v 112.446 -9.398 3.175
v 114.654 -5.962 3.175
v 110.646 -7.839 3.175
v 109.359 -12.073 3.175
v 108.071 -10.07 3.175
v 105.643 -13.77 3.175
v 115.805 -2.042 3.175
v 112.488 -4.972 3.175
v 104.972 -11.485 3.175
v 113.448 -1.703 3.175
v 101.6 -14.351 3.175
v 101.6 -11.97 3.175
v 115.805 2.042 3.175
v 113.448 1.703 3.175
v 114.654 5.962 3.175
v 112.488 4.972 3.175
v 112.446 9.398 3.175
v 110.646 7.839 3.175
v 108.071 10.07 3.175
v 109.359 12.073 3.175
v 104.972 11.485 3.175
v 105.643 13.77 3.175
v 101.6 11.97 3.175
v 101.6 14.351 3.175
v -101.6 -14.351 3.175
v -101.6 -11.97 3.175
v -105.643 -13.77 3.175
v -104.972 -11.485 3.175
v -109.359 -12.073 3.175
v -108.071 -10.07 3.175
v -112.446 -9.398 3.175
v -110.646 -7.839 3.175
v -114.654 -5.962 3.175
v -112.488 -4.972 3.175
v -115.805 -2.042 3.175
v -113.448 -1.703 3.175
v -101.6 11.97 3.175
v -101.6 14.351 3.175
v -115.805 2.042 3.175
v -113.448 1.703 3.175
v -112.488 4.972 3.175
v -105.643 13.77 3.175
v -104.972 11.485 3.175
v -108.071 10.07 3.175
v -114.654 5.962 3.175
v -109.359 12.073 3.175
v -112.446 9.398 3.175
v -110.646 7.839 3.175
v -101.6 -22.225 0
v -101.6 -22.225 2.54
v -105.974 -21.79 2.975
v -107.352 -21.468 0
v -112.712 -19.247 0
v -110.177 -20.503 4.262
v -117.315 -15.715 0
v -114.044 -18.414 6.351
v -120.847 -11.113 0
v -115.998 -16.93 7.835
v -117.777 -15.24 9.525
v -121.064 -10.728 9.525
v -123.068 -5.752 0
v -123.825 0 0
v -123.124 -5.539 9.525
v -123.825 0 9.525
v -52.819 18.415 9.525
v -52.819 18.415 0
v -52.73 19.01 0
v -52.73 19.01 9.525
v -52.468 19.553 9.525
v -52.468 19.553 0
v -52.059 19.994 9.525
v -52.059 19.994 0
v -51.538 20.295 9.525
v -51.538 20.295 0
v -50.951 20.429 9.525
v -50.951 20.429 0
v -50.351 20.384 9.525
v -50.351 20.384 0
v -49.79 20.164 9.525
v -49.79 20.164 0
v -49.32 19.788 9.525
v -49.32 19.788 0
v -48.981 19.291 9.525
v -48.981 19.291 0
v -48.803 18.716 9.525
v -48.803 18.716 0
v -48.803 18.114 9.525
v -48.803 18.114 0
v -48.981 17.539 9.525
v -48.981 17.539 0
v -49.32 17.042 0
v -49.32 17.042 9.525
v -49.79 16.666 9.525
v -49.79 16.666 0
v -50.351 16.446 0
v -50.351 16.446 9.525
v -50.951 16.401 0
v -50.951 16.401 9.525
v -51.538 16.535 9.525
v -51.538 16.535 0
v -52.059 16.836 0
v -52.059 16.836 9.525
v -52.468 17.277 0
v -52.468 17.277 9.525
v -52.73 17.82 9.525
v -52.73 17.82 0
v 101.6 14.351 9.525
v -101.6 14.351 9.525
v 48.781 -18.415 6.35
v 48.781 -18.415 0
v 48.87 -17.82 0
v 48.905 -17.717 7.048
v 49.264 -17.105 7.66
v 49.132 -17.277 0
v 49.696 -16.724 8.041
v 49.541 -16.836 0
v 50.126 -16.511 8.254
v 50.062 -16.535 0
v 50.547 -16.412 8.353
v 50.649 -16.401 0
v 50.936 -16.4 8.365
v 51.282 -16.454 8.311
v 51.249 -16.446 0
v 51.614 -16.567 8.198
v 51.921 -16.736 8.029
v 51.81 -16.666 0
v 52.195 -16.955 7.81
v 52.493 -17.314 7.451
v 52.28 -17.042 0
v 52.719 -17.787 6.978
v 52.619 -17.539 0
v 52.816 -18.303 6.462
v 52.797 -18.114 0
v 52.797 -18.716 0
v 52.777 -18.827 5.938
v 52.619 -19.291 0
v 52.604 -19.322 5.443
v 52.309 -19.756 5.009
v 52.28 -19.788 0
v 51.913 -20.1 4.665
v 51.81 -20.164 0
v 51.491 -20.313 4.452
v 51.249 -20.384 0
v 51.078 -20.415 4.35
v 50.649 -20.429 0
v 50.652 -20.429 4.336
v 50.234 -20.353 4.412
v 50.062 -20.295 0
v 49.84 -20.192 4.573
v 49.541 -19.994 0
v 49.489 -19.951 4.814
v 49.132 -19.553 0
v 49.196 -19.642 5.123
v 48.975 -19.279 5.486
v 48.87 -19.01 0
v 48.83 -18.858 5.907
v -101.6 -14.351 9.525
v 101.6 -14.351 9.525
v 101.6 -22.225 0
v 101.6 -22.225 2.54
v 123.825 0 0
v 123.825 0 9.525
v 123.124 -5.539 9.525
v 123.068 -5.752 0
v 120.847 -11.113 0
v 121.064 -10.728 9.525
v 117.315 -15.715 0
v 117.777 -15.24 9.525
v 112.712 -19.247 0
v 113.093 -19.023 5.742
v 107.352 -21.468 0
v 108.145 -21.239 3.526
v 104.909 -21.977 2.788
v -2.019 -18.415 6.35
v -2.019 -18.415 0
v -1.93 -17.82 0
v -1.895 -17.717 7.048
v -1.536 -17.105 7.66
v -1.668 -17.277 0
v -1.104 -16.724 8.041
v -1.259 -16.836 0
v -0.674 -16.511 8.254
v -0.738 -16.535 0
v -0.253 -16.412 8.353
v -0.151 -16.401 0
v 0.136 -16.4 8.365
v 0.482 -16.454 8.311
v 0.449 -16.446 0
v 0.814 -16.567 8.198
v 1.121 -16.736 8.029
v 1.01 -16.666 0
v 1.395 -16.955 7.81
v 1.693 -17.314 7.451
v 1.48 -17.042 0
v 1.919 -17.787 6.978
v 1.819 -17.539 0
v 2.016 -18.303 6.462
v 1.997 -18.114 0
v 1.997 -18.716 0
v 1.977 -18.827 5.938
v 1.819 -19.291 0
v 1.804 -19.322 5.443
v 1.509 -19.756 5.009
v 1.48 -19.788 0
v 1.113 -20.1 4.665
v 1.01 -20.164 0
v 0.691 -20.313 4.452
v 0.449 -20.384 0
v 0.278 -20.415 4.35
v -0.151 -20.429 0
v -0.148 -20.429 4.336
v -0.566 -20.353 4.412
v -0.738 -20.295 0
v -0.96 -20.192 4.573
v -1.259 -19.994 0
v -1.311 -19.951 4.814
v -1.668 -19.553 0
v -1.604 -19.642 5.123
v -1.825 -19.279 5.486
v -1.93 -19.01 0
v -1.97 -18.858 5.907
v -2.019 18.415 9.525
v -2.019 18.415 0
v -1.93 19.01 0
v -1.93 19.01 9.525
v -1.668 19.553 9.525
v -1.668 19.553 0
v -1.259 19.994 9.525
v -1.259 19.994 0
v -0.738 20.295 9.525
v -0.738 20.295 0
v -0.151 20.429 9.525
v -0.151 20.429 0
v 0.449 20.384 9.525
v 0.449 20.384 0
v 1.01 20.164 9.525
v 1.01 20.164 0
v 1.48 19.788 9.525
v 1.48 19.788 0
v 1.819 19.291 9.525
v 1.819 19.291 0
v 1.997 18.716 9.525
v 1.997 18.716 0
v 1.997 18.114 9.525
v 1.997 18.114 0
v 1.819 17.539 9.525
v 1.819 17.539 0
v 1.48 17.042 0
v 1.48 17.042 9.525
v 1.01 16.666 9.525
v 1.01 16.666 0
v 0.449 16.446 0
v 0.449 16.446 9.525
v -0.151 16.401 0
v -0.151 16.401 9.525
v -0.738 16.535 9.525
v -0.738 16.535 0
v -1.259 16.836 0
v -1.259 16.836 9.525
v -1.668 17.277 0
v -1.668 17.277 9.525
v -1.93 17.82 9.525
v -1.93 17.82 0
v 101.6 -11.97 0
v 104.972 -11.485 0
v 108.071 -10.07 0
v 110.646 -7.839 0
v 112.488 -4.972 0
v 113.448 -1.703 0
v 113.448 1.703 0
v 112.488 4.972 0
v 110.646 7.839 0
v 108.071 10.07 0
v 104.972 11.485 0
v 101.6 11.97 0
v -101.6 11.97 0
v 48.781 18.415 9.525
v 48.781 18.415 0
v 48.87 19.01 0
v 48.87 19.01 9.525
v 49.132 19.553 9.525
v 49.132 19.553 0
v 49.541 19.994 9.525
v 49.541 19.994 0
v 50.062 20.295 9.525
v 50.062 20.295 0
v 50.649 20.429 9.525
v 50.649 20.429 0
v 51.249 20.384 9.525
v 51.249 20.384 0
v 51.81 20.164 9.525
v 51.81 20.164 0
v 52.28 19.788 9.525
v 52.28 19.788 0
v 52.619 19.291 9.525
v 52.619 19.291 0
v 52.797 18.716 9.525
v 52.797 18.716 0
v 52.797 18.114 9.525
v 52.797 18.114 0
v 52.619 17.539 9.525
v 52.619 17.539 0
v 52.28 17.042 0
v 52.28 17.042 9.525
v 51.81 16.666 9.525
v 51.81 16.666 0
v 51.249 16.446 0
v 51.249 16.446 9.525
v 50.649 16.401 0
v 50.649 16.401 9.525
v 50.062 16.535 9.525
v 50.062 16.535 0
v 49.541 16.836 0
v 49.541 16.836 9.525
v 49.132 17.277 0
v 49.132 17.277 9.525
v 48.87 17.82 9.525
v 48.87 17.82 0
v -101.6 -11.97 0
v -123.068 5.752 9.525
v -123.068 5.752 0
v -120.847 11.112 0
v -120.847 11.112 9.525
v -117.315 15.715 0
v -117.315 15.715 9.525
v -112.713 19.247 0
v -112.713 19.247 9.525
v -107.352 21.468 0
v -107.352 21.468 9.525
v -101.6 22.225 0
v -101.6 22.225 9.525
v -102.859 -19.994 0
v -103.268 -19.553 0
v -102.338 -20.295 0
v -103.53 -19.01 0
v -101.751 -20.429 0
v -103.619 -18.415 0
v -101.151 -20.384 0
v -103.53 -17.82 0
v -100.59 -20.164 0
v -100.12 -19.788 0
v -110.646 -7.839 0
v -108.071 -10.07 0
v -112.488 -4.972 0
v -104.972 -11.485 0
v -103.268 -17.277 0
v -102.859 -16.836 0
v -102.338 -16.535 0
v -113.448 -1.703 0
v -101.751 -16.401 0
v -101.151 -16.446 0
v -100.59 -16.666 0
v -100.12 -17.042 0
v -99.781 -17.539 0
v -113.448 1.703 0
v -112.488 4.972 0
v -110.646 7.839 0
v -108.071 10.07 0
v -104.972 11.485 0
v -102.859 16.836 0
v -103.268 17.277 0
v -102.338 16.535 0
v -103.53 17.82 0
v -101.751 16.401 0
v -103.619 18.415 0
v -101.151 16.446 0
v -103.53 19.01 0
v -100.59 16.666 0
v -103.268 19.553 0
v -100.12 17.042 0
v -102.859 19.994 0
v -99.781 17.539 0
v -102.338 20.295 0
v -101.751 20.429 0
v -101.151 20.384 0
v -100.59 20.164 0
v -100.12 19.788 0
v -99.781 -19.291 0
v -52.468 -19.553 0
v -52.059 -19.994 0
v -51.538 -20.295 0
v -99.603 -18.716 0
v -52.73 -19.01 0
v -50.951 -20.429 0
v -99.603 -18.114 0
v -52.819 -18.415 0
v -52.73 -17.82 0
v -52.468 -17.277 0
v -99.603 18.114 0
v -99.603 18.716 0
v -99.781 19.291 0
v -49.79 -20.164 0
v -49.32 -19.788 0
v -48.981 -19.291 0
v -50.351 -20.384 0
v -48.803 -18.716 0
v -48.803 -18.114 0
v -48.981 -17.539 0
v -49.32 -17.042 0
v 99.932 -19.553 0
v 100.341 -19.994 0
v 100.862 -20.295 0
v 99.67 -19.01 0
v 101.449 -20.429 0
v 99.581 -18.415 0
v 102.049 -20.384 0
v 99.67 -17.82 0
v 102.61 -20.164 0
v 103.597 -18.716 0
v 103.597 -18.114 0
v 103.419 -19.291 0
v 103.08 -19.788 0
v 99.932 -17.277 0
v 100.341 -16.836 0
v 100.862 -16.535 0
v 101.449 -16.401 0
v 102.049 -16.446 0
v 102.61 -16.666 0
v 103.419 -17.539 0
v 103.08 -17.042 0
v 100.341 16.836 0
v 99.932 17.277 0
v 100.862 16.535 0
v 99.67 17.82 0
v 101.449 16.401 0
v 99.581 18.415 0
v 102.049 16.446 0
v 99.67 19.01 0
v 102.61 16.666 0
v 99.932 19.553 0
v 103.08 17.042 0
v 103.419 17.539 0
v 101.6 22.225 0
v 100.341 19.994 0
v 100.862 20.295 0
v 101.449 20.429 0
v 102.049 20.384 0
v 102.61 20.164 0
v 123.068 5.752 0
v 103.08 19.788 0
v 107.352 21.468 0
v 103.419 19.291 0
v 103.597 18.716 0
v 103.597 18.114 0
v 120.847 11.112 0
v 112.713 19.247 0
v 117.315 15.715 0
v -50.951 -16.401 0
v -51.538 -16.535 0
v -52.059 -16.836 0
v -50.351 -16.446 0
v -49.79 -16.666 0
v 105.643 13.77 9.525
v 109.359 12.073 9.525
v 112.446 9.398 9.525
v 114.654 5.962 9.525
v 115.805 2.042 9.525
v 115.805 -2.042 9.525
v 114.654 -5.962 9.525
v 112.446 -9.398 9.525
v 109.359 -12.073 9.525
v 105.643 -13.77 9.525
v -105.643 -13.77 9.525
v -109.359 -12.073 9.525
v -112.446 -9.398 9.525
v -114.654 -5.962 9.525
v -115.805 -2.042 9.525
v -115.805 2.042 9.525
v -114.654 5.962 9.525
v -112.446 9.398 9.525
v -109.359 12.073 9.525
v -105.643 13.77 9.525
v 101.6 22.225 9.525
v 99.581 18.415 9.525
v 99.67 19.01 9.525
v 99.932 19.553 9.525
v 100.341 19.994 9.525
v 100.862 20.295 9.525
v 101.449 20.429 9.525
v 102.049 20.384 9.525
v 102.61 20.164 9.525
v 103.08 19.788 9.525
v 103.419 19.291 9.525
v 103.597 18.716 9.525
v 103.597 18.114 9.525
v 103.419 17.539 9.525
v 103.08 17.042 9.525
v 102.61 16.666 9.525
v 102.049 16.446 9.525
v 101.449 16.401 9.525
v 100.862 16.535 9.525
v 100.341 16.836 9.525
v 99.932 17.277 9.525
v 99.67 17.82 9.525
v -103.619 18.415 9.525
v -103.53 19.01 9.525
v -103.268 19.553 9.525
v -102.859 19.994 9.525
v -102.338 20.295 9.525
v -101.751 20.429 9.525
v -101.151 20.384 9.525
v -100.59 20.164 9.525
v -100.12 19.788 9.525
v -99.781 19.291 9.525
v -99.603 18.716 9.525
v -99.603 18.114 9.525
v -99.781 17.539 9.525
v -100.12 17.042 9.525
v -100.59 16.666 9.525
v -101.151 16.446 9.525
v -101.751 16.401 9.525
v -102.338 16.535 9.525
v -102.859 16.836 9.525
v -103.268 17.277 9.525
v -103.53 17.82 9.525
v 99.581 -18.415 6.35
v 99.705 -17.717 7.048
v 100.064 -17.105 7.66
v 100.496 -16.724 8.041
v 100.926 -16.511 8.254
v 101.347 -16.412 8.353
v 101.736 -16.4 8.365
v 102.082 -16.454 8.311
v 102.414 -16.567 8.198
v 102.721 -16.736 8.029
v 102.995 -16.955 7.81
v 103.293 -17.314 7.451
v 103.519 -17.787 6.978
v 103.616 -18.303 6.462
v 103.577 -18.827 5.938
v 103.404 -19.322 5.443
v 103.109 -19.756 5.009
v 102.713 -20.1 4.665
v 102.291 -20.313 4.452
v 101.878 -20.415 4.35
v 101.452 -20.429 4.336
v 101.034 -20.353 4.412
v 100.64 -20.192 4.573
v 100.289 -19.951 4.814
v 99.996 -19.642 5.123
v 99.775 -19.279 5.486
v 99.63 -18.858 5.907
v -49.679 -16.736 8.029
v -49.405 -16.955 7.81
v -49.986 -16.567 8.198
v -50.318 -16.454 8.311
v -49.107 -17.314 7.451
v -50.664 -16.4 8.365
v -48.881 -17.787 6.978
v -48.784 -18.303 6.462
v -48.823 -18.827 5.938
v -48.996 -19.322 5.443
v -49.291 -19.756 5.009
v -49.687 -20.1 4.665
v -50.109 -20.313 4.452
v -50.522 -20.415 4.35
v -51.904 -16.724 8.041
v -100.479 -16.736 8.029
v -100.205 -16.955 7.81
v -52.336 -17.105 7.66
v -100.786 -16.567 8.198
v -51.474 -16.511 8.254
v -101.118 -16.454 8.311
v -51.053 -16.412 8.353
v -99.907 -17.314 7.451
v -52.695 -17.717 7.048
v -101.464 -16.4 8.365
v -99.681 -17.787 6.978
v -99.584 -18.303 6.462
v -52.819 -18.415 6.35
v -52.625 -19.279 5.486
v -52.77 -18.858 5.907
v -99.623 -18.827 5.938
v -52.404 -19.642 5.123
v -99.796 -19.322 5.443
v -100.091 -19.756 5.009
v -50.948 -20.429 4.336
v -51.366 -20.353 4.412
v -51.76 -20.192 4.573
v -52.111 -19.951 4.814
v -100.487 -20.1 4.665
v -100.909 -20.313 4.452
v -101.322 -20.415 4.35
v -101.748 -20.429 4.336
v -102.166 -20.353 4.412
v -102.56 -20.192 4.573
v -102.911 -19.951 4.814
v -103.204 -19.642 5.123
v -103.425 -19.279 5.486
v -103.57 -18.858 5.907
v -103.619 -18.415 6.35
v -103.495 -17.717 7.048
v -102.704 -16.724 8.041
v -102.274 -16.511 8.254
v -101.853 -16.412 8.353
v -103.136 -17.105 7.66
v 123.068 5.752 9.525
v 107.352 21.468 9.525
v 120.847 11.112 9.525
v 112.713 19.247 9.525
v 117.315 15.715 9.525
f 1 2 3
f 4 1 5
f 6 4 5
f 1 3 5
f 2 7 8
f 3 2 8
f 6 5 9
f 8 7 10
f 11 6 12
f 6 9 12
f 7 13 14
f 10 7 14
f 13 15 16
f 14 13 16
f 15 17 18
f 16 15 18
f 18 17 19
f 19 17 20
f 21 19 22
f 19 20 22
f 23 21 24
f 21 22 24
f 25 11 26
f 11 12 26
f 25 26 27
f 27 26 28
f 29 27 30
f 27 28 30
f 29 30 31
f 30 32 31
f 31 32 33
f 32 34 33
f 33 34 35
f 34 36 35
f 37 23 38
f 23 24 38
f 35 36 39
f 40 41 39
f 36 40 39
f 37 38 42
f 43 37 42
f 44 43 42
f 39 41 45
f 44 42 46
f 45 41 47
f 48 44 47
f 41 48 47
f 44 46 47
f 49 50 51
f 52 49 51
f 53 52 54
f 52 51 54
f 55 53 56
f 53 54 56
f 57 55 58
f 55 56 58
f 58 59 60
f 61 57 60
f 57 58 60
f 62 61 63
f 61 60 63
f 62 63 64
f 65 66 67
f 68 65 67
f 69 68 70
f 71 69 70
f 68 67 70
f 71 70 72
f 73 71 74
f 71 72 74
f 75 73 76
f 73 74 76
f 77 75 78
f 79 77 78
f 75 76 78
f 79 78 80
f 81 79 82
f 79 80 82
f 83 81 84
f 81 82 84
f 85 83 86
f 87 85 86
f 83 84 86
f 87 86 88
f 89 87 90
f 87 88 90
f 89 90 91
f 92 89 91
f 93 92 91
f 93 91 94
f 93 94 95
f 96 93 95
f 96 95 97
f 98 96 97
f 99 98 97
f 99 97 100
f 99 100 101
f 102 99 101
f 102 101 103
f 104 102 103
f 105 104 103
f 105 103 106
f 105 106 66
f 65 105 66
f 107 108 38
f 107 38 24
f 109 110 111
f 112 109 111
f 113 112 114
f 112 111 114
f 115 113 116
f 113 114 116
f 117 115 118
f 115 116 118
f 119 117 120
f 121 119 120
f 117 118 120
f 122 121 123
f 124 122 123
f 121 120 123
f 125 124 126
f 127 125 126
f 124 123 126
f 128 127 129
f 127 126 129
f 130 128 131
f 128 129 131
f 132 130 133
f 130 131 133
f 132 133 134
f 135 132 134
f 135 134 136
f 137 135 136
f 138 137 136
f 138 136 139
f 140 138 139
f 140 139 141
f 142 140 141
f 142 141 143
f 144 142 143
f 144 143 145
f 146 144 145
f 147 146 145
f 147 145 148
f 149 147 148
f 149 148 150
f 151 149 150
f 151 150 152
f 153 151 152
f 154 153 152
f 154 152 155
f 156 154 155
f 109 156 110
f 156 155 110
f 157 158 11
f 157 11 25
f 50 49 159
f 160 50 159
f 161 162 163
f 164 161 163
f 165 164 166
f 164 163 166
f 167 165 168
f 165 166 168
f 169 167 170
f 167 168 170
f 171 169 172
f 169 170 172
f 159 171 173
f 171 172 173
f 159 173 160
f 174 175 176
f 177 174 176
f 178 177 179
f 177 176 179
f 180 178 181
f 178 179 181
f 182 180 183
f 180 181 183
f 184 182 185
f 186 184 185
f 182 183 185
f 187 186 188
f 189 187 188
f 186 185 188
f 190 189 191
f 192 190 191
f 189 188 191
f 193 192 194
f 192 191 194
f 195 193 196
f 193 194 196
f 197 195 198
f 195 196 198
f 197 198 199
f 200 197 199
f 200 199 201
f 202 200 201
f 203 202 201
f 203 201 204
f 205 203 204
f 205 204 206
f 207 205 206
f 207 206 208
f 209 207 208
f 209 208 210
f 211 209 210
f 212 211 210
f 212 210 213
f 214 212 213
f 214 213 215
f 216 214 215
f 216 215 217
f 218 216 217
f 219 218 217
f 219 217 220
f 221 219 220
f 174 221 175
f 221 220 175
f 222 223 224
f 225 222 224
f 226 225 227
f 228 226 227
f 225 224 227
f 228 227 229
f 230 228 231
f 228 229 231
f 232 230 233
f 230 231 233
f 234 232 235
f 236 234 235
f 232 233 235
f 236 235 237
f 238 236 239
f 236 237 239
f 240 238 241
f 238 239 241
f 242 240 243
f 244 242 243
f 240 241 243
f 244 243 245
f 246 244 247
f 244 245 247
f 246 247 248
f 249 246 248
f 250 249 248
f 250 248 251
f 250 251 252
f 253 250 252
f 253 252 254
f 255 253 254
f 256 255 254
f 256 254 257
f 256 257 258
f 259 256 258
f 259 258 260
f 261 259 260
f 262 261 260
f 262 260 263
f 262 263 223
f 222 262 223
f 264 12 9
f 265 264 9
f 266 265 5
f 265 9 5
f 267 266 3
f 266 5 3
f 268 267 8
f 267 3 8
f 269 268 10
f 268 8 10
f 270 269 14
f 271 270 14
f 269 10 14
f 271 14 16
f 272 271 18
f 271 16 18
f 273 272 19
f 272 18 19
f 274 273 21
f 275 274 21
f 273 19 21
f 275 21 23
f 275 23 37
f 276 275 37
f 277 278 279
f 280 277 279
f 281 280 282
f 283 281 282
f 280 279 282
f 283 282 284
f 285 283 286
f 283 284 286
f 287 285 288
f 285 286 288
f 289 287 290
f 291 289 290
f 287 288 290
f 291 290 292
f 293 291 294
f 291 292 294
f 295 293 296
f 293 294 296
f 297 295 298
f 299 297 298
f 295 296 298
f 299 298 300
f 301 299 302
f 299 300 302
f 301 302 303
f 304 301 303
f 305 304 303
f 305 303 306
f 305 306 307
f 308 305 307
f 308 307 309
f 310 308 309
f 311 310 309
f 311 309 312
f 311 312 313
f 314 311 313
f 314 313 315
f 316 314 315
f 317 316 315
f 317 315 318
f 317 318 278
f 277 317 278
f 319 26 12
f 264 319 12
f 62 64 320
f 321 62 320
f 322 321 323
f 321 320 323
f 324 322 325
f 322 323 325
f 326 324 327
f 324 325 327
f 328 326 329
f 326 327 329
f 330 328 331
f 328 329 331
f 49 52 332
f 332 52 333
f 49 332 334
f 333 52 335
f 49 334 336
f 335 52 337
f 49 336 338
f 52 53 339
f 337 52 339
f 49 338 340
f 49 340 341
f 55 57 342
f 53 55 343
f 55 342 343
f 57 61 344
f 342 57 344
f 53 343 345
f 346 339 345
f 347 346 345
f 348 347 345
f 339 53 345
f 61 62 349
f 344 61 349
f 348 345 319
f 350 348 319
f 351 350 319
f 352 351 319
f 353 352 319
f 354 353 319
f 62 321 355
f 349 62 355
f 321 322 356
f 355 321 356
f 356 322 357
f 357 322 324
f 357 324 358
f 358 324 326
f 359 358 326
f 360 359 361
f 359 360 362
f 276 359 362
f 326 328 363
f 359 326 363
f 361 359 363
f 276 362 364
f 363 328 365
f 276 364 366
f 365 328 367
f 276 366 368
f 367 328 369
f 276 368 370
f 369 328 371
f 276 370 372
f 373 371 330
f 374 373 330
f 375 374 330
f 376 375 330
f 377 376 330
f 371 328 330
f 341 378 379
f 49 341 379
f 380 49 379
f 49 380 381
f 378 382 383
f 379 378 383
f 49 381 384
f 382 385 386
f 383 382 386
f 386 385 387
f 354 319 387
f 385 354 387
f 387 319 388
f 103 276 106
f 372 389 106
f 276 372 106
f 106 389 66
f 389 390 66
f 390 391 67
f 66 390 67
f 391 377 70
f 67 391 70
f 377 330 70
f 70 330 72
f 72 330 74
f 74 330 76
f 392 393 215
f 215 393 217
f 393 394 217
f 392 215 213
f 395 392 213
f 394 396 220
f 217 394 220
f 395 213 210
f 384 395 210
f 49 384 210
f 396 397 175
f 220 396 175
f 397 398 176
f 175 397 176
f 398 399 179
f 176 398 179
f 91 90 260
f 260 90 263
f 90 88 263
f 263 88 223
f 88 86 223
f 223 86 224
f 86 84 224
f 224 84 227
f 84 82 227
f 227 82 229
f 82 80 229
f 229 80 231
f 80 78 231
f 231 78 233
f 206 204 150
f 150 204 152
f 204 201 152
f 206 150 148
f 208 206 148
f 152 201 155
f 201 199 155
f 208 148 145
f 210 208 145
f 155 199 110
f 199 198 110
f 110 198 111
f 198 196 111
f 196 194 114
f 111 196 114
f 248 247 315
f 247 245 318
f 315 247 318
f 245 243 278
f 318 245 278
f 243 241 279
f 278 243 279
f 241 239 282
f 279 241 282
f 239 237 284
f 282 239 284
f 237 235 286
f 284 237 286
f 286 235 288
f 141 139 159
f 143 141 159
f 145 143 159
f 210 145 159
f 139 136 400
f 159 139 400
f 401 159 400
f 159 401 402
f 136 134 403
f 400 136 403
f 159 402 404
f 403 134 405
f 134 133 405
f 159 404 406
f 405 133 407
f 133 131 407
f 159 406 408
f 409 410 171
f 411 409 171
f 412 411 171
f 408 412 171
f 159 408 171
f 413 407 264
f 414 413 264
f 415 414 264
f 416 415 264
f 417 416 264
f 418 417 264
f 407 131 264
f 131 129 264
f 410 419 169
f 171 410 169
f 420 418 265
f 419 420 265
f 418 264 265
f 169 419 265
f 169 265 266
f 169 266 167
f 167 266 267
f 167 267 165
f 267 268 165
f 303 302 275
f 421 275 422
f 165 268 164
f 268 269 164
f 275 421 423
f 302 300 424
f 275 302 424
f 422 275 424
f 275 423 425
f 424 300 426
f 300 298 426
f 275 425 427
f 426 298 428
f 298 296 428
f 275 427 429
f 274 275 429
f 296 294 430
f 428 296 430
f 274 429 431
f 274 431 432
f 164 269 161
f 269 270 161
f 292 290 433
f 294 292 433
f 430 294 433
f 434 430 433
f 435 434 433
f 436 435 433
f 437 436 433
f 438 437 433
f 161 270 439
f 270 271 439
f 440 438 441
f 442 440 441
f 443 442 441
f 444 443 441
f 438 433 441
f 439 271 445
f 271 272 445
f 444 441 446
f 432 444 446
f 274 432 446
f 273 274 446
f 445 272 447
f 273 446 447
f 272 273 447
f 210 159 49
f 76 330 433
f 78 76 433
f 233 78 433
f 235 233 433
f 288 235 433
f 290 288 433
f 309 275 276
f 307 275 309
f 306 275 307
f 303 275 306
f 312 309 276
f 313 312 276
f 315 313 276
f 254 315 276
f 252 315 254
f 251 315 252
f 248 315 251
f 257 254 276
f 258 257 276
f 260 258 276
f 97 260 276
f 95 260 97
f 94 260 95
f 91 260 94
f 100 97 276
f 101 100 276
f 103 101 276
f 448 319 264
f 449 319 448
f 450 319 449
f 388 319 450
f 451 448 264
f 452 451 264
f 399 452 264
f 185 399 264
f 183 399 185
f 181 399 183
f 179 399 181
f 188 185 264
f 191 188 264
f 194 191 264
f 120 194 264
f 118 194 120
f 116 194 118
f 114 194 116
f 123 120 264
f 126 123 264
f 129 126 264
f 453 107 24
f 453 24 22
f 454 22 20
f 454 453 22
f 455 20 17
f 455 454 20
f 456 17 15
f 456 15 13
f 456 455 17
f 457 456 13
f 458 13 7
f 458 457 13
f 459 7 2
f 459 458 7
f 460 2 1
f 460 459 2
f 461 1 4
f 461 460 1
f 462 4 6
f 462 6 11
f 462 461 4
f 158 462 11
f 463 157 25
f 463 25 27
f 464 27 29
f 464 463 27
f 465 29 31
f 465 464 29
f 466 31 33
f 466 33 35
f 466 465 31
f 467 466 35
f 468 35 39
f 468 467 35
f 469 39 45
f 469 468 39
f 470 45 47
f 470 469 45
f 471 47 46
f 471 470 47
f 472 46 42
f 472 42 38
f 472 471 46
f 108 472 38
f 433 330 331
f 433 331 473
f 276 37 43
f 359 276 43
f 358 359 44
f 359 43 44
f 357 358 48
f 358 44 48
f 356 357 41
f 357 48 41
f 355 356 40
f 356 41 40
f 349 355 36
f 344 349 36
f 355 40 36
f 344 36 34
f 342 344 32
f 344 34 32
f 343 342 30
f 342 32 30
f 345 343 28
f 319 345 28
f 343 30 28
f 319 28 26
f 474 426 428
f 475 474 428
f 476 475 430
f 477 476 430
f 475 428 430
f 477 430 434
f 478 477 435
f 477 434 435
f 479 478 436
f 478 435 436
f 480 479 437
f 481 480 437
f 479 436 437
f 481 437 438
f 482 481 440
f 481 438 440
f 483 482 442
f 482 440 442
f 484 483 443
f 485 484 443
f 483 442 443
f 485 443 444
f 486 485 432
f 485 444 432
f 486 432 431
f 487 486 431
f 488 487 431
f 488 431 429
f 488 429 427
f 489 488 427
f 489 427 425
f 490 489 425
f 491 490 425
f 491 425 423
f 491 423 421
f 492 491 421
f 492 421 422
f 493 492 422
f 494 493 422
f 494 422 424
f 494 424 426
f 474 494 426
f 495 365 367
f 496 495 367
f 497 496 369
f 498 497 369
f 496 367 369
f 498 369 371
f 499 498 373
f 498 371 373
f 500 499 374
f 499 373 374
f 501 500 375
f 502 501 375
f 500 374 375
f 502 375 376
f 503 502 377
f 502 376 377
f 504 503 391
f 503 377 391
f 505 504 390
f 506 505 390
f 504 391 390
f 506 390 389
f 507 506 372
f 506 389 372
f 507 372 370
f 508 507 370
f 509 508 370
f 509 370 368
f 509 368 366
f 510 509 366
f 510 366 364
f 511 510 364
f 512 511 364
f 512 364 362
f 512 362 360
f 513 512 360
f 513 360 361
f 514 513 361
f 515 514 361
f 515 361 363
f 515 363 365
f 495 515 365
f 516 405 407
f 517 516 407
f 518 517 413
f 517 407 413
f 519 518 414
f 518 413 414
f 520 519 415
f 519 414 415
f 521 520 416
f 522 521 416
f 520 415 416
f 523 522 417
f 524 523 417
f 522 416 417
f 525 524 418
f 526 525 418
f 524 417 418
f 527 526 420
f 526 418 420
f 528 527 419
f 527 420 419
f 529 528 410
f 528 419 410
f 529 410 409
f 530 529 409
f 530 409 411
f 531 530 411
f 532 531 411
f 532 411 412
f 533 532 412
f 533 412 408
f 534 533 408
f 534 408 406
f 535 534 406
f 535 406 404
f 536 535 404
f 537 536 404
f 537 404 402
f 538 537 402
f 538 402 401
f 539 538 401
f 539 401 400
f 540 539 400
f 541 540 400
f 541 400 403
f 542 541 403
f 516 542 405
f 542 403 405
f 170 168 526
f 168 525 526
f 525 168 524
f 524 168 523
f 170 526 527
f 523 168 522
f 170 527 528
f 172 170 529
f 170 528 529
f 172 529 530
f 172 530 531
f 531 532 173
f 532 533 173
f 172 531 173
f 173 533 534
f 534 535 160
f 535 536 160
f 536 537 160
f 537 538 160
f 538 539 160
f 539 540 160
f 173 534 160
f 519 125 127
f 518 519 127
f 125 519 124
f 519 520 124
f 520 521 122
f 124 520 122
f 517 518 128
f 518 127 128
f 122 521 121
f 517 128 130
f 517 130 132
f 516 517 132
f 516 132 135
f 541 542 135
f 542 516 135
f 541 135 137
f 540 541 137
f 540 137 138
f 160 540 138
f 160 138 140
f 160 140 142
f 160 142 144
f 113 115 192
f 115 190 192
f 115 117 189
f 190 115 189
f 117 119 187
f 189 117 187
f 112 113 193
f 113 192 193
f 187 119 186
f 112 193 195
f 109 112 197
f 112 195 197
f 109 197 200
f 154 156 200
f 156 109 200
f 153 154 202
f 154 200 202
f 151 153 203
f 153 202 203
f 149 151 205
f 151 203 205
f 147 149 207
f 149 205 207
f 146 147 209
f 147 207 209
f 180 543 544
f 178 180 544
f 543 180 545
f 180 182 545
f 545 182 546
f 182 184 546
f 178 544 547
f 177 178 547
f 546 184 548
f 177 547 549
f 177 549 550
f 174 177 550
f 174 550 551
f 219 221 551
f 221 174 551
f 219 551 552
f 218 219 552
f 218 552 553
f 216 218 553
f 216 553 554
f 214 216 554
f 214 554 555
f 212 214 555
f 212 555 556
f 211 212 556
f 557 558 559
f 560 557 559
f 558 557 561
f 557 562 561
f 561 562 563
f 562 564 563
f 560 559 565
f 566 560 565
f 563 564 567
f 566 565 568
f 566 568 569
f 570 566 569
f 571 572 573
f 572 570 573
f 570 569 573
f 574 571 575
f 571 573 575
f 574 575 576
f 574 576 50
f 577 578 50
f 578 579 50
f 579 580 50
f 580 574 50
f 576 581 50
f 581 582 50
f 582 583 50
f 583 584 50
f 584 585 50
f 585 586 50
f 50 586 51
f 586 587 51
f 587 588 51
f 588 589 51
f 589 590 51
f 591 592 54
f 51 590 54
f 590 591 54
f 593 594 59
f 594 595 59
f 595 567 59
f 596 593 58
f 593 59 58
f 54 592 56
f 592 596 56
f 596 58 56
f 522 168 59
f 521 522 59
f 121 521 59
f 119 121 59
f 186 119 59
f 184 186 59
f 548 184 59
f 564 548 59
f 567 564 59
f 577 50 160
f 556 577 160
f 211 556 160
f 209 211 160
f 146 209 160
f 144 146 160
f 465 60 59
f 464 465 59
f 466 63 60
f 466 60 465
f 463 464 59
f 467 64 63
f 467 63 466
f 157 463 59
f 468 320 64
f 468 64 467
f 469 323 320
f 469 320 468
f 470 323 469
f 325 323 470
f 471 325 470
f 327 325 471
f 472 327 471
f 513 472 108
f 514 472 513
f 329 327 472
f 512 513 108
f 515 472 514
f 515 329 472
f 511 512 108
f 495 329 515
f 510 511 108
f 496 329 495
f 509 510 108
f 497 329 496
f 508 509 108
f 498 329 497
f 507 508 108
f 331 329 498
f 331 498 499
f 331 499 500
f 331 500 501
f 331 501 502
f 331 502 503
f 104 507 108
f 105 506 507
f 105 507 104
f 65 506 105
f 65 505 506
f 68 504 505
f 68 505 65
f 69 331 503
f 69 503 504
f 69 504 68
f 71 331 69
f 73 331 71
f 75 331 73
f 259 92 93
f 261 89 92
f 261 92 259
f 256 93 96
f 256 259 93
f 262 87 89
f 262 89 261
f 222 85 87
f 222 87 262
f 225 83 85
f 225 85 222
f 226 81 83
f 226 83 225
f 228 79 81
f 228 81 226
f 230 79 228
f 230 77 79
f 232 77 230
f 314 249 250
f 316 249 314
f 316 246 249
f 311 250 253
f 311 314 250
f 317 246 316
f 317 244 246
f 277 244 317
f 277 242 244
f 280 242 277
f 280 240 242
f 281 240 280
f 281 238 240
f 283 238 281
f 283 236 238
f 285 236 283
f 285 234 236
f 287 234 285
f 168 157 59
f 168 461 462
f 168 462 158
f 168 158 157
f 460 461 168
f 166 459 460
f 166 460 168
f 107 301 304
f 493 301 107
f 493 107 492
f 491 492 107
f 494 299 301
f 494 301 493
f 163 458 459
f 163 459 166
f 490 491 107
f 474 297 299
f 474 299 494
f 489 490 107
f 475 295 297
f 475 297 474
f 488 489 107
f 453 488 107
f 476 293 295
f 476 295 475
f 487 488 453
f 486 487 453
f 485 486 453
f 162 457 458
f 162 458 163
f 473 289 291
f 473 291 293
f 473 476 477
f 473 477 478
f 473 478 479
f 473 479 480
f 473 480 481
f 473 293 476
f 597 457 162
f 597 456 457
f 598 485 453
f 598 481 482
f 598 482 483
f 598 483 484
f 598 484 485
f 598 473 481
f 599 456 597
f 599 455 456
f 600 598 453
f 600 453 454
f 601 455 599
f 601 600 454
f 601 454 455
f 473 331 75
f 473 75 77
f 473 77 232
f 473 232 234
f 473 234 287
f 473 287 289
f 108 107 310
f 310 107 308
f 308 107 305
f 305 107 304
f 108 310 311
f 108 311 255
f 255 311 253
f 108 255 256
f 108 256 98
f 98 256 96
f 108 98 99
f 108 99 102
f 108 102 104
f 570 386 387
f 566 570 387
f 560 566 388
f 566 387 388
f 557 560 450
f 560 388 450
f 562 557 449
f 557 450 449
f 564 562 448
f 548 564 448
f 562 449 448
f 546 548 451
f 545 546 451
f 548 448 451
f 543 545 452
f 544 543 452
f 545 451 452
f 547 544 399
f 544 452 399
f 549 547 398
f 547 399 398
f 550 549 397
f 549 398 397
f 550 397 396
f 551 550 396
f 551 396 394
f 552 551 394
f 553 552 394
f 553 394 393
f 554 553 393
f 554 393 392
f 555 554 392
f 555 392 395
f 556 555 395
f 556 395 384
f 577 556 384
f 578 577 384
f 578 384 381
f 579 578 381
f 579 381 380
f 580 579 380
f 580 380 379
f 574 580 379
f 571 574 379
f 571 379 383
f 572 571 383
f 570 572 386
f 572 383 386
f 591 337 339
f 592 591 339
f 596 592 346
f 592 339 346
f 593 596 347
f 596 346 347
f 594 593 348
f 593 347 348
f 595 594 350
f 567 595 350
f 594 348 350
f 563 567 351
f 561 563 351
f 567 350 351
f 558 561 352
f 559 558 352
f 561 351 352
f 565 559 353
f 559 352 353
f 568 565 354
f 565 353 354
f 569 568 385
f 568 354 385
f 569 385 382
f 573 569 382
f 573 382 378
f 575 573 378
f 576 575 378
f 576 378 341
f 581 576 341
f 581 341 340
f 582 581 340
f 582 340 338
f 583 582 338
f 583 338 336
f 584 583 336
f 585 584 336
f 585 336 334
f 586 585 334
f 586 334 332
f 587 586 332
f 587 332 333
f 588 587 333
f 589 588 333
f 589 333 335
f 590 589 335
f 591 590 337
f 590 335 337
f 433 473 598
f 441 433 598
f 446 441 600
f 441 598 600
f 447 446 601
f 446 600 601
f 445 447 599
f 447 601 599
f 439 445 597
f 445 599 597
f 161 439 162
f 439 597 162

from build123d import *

# Parameters (mm, degrees)
SKETCH1_W              = 247.65
SKETCH1_H              = 44.45
BOSS_EXTRUDE1_DEPTH    = 9.525
CUT_EXTRUDE1_DEPTH     = 6.35
CUT_EXTRUDE3_DEPTH     = 126.963898598
CUT_EXTRUDE2_DEPTH     = 127.163809688
F_10_32_TAPPED_HOLE1_D = 4.0386
CHAMFER2_SIZE          = 6.985


with BuildPart() as part:
    # Sketch1 → Boss-Extrude1 (new body)
    with BuildSketch(Plane.XY):
        Rectangle(SKETCH1_W, SKETCH1_H)
    extrude(amount=BOSS_EXTRUDE1_DEPTH)

    # Sketch2 → Cut-Extrude1 (cut)
    with BuildSketch(Plane.XY.offset(9.525)):
        with BuildLine():
            Line((101.6, -14.351), (-101.6, -14.351))
            ThreePointArc((-101.6, -14.351), (-115.951, 0), (-101.6, 14.351))
            Line((-101.6, 14.351), (101.6, 14.351))
            ThreePointArc((101.6, 14.351), (115.951, 0), (101.6, -14.351))
        make_face()
    extrude(amount=-CUT_EXTRUDE1_DEPTH, mode=Mode.SUBTRACT)

    # Sketch14 → Cut-Extrude3 (cut, through all)
    with BuildSketch(Plane.XY.offset(3.175)):
        with BuildLine():
            Line((101.6, 11.96975), (-101.6, 11.96975))
            ThreePointArc((-101.6, 11.96975), (-113.56975, 0), (-101.6, -11.96975))
            Line((-101.6, -11.96975), (101.6, -11.96975))
            ThreePointArc((101.6, -11.96975), (113.56975, 0), (101.6, 11.96975))
        make_face()
    extrude(amount=-CUT_EXTRUDE3_DEPTH, mode=Mode.SUBTRACT)

    # Sketch3 → Cut-Extrude2 (cut, through all)
    with BuildSketch(Plane.XY.offset(9.525)):
        with BuildLine():
            ThreePointArc((-123.825, -1.74e-07), (-117.315448274, 15.71544815), (-101.6, 22.225))
            Line((-101.6, 22.225), (-123.825, 22.225))
            Line((-123.825, 22.225), (-123.825, -1.74e-07))
        make_face()
        with BuildLine():
            ThreePointArc((-101.6, -22.225), (-117.31544815, -15.715448274), (-123.825, -1.74e-07))
            Line((-123.825, -1.74e-07), (-123.825, -22.225))
            Line((-123.825, -22.225), (-101.6, -22.225))
        make_face()
        with BuildLine():
            Line((123.825, -22.225), (123.825, -6.4e-08))
            ThreePointArc((123.825, -6.4e-08), (117.315448189, -15.715448235), (101.6, -22.225))
            Line((101.6, -22.225), (123.825, -22.225))
        make_face()
        with BuildLine():
            Line((123.825, 22.225), (101.6, 22.225))
            ThreePointArc((101.6, 22.225), (117.315448235, 15.715448189), (123.825, -6.4e-08))
            Line((123.825, -6.4e-08), (123.825, 22.225))
        make_face()
    extrude(amount=-CUT_EXTRUDE2_DEPTH, mode=Mode.SUBTRACT)

    # #10-32 Tapped Hole1 (through all)
    with Locations(Plane.XY.offset(9.525)):
        with Locations((-101.6, 18.415), (-50.8, 18.415), (0, 18.415), (50.8, 18.415), (101.6, 18.415), (101.6, -18.415), (50.8, -18.415), (0, -18.415), (-50.8, -18.415), (-101.6, -18.415)):
            Hole(F_10_32_TAPPED_HOLE1_D / 2)

    # Chamfer2
    # the kernel refuses this chamfer: 6.985 mm, written as the material it takes off along each edge
    with BuildSketch(Plane(origin=(-119.563205671, -22.225, 9.525), x_dir=(0, 0.9996219169112968, 0.027495876610586303), z_dir=(1, 0, 0))) as chamfer2_piece_1:
        Polygon((CHAMFER2_SIZE * 0.999621916911, -CHAMFER2_SIZE * 0.0274958766106), (-CHAMFER2_SIZE * 0.0274958766106, -CHAMFER2_SIZE * 0.999621916911), (0, 0), align=None)
    extrude(amount=239.126411342, mode=Mode.SUBTRACT)


solid = part.part
